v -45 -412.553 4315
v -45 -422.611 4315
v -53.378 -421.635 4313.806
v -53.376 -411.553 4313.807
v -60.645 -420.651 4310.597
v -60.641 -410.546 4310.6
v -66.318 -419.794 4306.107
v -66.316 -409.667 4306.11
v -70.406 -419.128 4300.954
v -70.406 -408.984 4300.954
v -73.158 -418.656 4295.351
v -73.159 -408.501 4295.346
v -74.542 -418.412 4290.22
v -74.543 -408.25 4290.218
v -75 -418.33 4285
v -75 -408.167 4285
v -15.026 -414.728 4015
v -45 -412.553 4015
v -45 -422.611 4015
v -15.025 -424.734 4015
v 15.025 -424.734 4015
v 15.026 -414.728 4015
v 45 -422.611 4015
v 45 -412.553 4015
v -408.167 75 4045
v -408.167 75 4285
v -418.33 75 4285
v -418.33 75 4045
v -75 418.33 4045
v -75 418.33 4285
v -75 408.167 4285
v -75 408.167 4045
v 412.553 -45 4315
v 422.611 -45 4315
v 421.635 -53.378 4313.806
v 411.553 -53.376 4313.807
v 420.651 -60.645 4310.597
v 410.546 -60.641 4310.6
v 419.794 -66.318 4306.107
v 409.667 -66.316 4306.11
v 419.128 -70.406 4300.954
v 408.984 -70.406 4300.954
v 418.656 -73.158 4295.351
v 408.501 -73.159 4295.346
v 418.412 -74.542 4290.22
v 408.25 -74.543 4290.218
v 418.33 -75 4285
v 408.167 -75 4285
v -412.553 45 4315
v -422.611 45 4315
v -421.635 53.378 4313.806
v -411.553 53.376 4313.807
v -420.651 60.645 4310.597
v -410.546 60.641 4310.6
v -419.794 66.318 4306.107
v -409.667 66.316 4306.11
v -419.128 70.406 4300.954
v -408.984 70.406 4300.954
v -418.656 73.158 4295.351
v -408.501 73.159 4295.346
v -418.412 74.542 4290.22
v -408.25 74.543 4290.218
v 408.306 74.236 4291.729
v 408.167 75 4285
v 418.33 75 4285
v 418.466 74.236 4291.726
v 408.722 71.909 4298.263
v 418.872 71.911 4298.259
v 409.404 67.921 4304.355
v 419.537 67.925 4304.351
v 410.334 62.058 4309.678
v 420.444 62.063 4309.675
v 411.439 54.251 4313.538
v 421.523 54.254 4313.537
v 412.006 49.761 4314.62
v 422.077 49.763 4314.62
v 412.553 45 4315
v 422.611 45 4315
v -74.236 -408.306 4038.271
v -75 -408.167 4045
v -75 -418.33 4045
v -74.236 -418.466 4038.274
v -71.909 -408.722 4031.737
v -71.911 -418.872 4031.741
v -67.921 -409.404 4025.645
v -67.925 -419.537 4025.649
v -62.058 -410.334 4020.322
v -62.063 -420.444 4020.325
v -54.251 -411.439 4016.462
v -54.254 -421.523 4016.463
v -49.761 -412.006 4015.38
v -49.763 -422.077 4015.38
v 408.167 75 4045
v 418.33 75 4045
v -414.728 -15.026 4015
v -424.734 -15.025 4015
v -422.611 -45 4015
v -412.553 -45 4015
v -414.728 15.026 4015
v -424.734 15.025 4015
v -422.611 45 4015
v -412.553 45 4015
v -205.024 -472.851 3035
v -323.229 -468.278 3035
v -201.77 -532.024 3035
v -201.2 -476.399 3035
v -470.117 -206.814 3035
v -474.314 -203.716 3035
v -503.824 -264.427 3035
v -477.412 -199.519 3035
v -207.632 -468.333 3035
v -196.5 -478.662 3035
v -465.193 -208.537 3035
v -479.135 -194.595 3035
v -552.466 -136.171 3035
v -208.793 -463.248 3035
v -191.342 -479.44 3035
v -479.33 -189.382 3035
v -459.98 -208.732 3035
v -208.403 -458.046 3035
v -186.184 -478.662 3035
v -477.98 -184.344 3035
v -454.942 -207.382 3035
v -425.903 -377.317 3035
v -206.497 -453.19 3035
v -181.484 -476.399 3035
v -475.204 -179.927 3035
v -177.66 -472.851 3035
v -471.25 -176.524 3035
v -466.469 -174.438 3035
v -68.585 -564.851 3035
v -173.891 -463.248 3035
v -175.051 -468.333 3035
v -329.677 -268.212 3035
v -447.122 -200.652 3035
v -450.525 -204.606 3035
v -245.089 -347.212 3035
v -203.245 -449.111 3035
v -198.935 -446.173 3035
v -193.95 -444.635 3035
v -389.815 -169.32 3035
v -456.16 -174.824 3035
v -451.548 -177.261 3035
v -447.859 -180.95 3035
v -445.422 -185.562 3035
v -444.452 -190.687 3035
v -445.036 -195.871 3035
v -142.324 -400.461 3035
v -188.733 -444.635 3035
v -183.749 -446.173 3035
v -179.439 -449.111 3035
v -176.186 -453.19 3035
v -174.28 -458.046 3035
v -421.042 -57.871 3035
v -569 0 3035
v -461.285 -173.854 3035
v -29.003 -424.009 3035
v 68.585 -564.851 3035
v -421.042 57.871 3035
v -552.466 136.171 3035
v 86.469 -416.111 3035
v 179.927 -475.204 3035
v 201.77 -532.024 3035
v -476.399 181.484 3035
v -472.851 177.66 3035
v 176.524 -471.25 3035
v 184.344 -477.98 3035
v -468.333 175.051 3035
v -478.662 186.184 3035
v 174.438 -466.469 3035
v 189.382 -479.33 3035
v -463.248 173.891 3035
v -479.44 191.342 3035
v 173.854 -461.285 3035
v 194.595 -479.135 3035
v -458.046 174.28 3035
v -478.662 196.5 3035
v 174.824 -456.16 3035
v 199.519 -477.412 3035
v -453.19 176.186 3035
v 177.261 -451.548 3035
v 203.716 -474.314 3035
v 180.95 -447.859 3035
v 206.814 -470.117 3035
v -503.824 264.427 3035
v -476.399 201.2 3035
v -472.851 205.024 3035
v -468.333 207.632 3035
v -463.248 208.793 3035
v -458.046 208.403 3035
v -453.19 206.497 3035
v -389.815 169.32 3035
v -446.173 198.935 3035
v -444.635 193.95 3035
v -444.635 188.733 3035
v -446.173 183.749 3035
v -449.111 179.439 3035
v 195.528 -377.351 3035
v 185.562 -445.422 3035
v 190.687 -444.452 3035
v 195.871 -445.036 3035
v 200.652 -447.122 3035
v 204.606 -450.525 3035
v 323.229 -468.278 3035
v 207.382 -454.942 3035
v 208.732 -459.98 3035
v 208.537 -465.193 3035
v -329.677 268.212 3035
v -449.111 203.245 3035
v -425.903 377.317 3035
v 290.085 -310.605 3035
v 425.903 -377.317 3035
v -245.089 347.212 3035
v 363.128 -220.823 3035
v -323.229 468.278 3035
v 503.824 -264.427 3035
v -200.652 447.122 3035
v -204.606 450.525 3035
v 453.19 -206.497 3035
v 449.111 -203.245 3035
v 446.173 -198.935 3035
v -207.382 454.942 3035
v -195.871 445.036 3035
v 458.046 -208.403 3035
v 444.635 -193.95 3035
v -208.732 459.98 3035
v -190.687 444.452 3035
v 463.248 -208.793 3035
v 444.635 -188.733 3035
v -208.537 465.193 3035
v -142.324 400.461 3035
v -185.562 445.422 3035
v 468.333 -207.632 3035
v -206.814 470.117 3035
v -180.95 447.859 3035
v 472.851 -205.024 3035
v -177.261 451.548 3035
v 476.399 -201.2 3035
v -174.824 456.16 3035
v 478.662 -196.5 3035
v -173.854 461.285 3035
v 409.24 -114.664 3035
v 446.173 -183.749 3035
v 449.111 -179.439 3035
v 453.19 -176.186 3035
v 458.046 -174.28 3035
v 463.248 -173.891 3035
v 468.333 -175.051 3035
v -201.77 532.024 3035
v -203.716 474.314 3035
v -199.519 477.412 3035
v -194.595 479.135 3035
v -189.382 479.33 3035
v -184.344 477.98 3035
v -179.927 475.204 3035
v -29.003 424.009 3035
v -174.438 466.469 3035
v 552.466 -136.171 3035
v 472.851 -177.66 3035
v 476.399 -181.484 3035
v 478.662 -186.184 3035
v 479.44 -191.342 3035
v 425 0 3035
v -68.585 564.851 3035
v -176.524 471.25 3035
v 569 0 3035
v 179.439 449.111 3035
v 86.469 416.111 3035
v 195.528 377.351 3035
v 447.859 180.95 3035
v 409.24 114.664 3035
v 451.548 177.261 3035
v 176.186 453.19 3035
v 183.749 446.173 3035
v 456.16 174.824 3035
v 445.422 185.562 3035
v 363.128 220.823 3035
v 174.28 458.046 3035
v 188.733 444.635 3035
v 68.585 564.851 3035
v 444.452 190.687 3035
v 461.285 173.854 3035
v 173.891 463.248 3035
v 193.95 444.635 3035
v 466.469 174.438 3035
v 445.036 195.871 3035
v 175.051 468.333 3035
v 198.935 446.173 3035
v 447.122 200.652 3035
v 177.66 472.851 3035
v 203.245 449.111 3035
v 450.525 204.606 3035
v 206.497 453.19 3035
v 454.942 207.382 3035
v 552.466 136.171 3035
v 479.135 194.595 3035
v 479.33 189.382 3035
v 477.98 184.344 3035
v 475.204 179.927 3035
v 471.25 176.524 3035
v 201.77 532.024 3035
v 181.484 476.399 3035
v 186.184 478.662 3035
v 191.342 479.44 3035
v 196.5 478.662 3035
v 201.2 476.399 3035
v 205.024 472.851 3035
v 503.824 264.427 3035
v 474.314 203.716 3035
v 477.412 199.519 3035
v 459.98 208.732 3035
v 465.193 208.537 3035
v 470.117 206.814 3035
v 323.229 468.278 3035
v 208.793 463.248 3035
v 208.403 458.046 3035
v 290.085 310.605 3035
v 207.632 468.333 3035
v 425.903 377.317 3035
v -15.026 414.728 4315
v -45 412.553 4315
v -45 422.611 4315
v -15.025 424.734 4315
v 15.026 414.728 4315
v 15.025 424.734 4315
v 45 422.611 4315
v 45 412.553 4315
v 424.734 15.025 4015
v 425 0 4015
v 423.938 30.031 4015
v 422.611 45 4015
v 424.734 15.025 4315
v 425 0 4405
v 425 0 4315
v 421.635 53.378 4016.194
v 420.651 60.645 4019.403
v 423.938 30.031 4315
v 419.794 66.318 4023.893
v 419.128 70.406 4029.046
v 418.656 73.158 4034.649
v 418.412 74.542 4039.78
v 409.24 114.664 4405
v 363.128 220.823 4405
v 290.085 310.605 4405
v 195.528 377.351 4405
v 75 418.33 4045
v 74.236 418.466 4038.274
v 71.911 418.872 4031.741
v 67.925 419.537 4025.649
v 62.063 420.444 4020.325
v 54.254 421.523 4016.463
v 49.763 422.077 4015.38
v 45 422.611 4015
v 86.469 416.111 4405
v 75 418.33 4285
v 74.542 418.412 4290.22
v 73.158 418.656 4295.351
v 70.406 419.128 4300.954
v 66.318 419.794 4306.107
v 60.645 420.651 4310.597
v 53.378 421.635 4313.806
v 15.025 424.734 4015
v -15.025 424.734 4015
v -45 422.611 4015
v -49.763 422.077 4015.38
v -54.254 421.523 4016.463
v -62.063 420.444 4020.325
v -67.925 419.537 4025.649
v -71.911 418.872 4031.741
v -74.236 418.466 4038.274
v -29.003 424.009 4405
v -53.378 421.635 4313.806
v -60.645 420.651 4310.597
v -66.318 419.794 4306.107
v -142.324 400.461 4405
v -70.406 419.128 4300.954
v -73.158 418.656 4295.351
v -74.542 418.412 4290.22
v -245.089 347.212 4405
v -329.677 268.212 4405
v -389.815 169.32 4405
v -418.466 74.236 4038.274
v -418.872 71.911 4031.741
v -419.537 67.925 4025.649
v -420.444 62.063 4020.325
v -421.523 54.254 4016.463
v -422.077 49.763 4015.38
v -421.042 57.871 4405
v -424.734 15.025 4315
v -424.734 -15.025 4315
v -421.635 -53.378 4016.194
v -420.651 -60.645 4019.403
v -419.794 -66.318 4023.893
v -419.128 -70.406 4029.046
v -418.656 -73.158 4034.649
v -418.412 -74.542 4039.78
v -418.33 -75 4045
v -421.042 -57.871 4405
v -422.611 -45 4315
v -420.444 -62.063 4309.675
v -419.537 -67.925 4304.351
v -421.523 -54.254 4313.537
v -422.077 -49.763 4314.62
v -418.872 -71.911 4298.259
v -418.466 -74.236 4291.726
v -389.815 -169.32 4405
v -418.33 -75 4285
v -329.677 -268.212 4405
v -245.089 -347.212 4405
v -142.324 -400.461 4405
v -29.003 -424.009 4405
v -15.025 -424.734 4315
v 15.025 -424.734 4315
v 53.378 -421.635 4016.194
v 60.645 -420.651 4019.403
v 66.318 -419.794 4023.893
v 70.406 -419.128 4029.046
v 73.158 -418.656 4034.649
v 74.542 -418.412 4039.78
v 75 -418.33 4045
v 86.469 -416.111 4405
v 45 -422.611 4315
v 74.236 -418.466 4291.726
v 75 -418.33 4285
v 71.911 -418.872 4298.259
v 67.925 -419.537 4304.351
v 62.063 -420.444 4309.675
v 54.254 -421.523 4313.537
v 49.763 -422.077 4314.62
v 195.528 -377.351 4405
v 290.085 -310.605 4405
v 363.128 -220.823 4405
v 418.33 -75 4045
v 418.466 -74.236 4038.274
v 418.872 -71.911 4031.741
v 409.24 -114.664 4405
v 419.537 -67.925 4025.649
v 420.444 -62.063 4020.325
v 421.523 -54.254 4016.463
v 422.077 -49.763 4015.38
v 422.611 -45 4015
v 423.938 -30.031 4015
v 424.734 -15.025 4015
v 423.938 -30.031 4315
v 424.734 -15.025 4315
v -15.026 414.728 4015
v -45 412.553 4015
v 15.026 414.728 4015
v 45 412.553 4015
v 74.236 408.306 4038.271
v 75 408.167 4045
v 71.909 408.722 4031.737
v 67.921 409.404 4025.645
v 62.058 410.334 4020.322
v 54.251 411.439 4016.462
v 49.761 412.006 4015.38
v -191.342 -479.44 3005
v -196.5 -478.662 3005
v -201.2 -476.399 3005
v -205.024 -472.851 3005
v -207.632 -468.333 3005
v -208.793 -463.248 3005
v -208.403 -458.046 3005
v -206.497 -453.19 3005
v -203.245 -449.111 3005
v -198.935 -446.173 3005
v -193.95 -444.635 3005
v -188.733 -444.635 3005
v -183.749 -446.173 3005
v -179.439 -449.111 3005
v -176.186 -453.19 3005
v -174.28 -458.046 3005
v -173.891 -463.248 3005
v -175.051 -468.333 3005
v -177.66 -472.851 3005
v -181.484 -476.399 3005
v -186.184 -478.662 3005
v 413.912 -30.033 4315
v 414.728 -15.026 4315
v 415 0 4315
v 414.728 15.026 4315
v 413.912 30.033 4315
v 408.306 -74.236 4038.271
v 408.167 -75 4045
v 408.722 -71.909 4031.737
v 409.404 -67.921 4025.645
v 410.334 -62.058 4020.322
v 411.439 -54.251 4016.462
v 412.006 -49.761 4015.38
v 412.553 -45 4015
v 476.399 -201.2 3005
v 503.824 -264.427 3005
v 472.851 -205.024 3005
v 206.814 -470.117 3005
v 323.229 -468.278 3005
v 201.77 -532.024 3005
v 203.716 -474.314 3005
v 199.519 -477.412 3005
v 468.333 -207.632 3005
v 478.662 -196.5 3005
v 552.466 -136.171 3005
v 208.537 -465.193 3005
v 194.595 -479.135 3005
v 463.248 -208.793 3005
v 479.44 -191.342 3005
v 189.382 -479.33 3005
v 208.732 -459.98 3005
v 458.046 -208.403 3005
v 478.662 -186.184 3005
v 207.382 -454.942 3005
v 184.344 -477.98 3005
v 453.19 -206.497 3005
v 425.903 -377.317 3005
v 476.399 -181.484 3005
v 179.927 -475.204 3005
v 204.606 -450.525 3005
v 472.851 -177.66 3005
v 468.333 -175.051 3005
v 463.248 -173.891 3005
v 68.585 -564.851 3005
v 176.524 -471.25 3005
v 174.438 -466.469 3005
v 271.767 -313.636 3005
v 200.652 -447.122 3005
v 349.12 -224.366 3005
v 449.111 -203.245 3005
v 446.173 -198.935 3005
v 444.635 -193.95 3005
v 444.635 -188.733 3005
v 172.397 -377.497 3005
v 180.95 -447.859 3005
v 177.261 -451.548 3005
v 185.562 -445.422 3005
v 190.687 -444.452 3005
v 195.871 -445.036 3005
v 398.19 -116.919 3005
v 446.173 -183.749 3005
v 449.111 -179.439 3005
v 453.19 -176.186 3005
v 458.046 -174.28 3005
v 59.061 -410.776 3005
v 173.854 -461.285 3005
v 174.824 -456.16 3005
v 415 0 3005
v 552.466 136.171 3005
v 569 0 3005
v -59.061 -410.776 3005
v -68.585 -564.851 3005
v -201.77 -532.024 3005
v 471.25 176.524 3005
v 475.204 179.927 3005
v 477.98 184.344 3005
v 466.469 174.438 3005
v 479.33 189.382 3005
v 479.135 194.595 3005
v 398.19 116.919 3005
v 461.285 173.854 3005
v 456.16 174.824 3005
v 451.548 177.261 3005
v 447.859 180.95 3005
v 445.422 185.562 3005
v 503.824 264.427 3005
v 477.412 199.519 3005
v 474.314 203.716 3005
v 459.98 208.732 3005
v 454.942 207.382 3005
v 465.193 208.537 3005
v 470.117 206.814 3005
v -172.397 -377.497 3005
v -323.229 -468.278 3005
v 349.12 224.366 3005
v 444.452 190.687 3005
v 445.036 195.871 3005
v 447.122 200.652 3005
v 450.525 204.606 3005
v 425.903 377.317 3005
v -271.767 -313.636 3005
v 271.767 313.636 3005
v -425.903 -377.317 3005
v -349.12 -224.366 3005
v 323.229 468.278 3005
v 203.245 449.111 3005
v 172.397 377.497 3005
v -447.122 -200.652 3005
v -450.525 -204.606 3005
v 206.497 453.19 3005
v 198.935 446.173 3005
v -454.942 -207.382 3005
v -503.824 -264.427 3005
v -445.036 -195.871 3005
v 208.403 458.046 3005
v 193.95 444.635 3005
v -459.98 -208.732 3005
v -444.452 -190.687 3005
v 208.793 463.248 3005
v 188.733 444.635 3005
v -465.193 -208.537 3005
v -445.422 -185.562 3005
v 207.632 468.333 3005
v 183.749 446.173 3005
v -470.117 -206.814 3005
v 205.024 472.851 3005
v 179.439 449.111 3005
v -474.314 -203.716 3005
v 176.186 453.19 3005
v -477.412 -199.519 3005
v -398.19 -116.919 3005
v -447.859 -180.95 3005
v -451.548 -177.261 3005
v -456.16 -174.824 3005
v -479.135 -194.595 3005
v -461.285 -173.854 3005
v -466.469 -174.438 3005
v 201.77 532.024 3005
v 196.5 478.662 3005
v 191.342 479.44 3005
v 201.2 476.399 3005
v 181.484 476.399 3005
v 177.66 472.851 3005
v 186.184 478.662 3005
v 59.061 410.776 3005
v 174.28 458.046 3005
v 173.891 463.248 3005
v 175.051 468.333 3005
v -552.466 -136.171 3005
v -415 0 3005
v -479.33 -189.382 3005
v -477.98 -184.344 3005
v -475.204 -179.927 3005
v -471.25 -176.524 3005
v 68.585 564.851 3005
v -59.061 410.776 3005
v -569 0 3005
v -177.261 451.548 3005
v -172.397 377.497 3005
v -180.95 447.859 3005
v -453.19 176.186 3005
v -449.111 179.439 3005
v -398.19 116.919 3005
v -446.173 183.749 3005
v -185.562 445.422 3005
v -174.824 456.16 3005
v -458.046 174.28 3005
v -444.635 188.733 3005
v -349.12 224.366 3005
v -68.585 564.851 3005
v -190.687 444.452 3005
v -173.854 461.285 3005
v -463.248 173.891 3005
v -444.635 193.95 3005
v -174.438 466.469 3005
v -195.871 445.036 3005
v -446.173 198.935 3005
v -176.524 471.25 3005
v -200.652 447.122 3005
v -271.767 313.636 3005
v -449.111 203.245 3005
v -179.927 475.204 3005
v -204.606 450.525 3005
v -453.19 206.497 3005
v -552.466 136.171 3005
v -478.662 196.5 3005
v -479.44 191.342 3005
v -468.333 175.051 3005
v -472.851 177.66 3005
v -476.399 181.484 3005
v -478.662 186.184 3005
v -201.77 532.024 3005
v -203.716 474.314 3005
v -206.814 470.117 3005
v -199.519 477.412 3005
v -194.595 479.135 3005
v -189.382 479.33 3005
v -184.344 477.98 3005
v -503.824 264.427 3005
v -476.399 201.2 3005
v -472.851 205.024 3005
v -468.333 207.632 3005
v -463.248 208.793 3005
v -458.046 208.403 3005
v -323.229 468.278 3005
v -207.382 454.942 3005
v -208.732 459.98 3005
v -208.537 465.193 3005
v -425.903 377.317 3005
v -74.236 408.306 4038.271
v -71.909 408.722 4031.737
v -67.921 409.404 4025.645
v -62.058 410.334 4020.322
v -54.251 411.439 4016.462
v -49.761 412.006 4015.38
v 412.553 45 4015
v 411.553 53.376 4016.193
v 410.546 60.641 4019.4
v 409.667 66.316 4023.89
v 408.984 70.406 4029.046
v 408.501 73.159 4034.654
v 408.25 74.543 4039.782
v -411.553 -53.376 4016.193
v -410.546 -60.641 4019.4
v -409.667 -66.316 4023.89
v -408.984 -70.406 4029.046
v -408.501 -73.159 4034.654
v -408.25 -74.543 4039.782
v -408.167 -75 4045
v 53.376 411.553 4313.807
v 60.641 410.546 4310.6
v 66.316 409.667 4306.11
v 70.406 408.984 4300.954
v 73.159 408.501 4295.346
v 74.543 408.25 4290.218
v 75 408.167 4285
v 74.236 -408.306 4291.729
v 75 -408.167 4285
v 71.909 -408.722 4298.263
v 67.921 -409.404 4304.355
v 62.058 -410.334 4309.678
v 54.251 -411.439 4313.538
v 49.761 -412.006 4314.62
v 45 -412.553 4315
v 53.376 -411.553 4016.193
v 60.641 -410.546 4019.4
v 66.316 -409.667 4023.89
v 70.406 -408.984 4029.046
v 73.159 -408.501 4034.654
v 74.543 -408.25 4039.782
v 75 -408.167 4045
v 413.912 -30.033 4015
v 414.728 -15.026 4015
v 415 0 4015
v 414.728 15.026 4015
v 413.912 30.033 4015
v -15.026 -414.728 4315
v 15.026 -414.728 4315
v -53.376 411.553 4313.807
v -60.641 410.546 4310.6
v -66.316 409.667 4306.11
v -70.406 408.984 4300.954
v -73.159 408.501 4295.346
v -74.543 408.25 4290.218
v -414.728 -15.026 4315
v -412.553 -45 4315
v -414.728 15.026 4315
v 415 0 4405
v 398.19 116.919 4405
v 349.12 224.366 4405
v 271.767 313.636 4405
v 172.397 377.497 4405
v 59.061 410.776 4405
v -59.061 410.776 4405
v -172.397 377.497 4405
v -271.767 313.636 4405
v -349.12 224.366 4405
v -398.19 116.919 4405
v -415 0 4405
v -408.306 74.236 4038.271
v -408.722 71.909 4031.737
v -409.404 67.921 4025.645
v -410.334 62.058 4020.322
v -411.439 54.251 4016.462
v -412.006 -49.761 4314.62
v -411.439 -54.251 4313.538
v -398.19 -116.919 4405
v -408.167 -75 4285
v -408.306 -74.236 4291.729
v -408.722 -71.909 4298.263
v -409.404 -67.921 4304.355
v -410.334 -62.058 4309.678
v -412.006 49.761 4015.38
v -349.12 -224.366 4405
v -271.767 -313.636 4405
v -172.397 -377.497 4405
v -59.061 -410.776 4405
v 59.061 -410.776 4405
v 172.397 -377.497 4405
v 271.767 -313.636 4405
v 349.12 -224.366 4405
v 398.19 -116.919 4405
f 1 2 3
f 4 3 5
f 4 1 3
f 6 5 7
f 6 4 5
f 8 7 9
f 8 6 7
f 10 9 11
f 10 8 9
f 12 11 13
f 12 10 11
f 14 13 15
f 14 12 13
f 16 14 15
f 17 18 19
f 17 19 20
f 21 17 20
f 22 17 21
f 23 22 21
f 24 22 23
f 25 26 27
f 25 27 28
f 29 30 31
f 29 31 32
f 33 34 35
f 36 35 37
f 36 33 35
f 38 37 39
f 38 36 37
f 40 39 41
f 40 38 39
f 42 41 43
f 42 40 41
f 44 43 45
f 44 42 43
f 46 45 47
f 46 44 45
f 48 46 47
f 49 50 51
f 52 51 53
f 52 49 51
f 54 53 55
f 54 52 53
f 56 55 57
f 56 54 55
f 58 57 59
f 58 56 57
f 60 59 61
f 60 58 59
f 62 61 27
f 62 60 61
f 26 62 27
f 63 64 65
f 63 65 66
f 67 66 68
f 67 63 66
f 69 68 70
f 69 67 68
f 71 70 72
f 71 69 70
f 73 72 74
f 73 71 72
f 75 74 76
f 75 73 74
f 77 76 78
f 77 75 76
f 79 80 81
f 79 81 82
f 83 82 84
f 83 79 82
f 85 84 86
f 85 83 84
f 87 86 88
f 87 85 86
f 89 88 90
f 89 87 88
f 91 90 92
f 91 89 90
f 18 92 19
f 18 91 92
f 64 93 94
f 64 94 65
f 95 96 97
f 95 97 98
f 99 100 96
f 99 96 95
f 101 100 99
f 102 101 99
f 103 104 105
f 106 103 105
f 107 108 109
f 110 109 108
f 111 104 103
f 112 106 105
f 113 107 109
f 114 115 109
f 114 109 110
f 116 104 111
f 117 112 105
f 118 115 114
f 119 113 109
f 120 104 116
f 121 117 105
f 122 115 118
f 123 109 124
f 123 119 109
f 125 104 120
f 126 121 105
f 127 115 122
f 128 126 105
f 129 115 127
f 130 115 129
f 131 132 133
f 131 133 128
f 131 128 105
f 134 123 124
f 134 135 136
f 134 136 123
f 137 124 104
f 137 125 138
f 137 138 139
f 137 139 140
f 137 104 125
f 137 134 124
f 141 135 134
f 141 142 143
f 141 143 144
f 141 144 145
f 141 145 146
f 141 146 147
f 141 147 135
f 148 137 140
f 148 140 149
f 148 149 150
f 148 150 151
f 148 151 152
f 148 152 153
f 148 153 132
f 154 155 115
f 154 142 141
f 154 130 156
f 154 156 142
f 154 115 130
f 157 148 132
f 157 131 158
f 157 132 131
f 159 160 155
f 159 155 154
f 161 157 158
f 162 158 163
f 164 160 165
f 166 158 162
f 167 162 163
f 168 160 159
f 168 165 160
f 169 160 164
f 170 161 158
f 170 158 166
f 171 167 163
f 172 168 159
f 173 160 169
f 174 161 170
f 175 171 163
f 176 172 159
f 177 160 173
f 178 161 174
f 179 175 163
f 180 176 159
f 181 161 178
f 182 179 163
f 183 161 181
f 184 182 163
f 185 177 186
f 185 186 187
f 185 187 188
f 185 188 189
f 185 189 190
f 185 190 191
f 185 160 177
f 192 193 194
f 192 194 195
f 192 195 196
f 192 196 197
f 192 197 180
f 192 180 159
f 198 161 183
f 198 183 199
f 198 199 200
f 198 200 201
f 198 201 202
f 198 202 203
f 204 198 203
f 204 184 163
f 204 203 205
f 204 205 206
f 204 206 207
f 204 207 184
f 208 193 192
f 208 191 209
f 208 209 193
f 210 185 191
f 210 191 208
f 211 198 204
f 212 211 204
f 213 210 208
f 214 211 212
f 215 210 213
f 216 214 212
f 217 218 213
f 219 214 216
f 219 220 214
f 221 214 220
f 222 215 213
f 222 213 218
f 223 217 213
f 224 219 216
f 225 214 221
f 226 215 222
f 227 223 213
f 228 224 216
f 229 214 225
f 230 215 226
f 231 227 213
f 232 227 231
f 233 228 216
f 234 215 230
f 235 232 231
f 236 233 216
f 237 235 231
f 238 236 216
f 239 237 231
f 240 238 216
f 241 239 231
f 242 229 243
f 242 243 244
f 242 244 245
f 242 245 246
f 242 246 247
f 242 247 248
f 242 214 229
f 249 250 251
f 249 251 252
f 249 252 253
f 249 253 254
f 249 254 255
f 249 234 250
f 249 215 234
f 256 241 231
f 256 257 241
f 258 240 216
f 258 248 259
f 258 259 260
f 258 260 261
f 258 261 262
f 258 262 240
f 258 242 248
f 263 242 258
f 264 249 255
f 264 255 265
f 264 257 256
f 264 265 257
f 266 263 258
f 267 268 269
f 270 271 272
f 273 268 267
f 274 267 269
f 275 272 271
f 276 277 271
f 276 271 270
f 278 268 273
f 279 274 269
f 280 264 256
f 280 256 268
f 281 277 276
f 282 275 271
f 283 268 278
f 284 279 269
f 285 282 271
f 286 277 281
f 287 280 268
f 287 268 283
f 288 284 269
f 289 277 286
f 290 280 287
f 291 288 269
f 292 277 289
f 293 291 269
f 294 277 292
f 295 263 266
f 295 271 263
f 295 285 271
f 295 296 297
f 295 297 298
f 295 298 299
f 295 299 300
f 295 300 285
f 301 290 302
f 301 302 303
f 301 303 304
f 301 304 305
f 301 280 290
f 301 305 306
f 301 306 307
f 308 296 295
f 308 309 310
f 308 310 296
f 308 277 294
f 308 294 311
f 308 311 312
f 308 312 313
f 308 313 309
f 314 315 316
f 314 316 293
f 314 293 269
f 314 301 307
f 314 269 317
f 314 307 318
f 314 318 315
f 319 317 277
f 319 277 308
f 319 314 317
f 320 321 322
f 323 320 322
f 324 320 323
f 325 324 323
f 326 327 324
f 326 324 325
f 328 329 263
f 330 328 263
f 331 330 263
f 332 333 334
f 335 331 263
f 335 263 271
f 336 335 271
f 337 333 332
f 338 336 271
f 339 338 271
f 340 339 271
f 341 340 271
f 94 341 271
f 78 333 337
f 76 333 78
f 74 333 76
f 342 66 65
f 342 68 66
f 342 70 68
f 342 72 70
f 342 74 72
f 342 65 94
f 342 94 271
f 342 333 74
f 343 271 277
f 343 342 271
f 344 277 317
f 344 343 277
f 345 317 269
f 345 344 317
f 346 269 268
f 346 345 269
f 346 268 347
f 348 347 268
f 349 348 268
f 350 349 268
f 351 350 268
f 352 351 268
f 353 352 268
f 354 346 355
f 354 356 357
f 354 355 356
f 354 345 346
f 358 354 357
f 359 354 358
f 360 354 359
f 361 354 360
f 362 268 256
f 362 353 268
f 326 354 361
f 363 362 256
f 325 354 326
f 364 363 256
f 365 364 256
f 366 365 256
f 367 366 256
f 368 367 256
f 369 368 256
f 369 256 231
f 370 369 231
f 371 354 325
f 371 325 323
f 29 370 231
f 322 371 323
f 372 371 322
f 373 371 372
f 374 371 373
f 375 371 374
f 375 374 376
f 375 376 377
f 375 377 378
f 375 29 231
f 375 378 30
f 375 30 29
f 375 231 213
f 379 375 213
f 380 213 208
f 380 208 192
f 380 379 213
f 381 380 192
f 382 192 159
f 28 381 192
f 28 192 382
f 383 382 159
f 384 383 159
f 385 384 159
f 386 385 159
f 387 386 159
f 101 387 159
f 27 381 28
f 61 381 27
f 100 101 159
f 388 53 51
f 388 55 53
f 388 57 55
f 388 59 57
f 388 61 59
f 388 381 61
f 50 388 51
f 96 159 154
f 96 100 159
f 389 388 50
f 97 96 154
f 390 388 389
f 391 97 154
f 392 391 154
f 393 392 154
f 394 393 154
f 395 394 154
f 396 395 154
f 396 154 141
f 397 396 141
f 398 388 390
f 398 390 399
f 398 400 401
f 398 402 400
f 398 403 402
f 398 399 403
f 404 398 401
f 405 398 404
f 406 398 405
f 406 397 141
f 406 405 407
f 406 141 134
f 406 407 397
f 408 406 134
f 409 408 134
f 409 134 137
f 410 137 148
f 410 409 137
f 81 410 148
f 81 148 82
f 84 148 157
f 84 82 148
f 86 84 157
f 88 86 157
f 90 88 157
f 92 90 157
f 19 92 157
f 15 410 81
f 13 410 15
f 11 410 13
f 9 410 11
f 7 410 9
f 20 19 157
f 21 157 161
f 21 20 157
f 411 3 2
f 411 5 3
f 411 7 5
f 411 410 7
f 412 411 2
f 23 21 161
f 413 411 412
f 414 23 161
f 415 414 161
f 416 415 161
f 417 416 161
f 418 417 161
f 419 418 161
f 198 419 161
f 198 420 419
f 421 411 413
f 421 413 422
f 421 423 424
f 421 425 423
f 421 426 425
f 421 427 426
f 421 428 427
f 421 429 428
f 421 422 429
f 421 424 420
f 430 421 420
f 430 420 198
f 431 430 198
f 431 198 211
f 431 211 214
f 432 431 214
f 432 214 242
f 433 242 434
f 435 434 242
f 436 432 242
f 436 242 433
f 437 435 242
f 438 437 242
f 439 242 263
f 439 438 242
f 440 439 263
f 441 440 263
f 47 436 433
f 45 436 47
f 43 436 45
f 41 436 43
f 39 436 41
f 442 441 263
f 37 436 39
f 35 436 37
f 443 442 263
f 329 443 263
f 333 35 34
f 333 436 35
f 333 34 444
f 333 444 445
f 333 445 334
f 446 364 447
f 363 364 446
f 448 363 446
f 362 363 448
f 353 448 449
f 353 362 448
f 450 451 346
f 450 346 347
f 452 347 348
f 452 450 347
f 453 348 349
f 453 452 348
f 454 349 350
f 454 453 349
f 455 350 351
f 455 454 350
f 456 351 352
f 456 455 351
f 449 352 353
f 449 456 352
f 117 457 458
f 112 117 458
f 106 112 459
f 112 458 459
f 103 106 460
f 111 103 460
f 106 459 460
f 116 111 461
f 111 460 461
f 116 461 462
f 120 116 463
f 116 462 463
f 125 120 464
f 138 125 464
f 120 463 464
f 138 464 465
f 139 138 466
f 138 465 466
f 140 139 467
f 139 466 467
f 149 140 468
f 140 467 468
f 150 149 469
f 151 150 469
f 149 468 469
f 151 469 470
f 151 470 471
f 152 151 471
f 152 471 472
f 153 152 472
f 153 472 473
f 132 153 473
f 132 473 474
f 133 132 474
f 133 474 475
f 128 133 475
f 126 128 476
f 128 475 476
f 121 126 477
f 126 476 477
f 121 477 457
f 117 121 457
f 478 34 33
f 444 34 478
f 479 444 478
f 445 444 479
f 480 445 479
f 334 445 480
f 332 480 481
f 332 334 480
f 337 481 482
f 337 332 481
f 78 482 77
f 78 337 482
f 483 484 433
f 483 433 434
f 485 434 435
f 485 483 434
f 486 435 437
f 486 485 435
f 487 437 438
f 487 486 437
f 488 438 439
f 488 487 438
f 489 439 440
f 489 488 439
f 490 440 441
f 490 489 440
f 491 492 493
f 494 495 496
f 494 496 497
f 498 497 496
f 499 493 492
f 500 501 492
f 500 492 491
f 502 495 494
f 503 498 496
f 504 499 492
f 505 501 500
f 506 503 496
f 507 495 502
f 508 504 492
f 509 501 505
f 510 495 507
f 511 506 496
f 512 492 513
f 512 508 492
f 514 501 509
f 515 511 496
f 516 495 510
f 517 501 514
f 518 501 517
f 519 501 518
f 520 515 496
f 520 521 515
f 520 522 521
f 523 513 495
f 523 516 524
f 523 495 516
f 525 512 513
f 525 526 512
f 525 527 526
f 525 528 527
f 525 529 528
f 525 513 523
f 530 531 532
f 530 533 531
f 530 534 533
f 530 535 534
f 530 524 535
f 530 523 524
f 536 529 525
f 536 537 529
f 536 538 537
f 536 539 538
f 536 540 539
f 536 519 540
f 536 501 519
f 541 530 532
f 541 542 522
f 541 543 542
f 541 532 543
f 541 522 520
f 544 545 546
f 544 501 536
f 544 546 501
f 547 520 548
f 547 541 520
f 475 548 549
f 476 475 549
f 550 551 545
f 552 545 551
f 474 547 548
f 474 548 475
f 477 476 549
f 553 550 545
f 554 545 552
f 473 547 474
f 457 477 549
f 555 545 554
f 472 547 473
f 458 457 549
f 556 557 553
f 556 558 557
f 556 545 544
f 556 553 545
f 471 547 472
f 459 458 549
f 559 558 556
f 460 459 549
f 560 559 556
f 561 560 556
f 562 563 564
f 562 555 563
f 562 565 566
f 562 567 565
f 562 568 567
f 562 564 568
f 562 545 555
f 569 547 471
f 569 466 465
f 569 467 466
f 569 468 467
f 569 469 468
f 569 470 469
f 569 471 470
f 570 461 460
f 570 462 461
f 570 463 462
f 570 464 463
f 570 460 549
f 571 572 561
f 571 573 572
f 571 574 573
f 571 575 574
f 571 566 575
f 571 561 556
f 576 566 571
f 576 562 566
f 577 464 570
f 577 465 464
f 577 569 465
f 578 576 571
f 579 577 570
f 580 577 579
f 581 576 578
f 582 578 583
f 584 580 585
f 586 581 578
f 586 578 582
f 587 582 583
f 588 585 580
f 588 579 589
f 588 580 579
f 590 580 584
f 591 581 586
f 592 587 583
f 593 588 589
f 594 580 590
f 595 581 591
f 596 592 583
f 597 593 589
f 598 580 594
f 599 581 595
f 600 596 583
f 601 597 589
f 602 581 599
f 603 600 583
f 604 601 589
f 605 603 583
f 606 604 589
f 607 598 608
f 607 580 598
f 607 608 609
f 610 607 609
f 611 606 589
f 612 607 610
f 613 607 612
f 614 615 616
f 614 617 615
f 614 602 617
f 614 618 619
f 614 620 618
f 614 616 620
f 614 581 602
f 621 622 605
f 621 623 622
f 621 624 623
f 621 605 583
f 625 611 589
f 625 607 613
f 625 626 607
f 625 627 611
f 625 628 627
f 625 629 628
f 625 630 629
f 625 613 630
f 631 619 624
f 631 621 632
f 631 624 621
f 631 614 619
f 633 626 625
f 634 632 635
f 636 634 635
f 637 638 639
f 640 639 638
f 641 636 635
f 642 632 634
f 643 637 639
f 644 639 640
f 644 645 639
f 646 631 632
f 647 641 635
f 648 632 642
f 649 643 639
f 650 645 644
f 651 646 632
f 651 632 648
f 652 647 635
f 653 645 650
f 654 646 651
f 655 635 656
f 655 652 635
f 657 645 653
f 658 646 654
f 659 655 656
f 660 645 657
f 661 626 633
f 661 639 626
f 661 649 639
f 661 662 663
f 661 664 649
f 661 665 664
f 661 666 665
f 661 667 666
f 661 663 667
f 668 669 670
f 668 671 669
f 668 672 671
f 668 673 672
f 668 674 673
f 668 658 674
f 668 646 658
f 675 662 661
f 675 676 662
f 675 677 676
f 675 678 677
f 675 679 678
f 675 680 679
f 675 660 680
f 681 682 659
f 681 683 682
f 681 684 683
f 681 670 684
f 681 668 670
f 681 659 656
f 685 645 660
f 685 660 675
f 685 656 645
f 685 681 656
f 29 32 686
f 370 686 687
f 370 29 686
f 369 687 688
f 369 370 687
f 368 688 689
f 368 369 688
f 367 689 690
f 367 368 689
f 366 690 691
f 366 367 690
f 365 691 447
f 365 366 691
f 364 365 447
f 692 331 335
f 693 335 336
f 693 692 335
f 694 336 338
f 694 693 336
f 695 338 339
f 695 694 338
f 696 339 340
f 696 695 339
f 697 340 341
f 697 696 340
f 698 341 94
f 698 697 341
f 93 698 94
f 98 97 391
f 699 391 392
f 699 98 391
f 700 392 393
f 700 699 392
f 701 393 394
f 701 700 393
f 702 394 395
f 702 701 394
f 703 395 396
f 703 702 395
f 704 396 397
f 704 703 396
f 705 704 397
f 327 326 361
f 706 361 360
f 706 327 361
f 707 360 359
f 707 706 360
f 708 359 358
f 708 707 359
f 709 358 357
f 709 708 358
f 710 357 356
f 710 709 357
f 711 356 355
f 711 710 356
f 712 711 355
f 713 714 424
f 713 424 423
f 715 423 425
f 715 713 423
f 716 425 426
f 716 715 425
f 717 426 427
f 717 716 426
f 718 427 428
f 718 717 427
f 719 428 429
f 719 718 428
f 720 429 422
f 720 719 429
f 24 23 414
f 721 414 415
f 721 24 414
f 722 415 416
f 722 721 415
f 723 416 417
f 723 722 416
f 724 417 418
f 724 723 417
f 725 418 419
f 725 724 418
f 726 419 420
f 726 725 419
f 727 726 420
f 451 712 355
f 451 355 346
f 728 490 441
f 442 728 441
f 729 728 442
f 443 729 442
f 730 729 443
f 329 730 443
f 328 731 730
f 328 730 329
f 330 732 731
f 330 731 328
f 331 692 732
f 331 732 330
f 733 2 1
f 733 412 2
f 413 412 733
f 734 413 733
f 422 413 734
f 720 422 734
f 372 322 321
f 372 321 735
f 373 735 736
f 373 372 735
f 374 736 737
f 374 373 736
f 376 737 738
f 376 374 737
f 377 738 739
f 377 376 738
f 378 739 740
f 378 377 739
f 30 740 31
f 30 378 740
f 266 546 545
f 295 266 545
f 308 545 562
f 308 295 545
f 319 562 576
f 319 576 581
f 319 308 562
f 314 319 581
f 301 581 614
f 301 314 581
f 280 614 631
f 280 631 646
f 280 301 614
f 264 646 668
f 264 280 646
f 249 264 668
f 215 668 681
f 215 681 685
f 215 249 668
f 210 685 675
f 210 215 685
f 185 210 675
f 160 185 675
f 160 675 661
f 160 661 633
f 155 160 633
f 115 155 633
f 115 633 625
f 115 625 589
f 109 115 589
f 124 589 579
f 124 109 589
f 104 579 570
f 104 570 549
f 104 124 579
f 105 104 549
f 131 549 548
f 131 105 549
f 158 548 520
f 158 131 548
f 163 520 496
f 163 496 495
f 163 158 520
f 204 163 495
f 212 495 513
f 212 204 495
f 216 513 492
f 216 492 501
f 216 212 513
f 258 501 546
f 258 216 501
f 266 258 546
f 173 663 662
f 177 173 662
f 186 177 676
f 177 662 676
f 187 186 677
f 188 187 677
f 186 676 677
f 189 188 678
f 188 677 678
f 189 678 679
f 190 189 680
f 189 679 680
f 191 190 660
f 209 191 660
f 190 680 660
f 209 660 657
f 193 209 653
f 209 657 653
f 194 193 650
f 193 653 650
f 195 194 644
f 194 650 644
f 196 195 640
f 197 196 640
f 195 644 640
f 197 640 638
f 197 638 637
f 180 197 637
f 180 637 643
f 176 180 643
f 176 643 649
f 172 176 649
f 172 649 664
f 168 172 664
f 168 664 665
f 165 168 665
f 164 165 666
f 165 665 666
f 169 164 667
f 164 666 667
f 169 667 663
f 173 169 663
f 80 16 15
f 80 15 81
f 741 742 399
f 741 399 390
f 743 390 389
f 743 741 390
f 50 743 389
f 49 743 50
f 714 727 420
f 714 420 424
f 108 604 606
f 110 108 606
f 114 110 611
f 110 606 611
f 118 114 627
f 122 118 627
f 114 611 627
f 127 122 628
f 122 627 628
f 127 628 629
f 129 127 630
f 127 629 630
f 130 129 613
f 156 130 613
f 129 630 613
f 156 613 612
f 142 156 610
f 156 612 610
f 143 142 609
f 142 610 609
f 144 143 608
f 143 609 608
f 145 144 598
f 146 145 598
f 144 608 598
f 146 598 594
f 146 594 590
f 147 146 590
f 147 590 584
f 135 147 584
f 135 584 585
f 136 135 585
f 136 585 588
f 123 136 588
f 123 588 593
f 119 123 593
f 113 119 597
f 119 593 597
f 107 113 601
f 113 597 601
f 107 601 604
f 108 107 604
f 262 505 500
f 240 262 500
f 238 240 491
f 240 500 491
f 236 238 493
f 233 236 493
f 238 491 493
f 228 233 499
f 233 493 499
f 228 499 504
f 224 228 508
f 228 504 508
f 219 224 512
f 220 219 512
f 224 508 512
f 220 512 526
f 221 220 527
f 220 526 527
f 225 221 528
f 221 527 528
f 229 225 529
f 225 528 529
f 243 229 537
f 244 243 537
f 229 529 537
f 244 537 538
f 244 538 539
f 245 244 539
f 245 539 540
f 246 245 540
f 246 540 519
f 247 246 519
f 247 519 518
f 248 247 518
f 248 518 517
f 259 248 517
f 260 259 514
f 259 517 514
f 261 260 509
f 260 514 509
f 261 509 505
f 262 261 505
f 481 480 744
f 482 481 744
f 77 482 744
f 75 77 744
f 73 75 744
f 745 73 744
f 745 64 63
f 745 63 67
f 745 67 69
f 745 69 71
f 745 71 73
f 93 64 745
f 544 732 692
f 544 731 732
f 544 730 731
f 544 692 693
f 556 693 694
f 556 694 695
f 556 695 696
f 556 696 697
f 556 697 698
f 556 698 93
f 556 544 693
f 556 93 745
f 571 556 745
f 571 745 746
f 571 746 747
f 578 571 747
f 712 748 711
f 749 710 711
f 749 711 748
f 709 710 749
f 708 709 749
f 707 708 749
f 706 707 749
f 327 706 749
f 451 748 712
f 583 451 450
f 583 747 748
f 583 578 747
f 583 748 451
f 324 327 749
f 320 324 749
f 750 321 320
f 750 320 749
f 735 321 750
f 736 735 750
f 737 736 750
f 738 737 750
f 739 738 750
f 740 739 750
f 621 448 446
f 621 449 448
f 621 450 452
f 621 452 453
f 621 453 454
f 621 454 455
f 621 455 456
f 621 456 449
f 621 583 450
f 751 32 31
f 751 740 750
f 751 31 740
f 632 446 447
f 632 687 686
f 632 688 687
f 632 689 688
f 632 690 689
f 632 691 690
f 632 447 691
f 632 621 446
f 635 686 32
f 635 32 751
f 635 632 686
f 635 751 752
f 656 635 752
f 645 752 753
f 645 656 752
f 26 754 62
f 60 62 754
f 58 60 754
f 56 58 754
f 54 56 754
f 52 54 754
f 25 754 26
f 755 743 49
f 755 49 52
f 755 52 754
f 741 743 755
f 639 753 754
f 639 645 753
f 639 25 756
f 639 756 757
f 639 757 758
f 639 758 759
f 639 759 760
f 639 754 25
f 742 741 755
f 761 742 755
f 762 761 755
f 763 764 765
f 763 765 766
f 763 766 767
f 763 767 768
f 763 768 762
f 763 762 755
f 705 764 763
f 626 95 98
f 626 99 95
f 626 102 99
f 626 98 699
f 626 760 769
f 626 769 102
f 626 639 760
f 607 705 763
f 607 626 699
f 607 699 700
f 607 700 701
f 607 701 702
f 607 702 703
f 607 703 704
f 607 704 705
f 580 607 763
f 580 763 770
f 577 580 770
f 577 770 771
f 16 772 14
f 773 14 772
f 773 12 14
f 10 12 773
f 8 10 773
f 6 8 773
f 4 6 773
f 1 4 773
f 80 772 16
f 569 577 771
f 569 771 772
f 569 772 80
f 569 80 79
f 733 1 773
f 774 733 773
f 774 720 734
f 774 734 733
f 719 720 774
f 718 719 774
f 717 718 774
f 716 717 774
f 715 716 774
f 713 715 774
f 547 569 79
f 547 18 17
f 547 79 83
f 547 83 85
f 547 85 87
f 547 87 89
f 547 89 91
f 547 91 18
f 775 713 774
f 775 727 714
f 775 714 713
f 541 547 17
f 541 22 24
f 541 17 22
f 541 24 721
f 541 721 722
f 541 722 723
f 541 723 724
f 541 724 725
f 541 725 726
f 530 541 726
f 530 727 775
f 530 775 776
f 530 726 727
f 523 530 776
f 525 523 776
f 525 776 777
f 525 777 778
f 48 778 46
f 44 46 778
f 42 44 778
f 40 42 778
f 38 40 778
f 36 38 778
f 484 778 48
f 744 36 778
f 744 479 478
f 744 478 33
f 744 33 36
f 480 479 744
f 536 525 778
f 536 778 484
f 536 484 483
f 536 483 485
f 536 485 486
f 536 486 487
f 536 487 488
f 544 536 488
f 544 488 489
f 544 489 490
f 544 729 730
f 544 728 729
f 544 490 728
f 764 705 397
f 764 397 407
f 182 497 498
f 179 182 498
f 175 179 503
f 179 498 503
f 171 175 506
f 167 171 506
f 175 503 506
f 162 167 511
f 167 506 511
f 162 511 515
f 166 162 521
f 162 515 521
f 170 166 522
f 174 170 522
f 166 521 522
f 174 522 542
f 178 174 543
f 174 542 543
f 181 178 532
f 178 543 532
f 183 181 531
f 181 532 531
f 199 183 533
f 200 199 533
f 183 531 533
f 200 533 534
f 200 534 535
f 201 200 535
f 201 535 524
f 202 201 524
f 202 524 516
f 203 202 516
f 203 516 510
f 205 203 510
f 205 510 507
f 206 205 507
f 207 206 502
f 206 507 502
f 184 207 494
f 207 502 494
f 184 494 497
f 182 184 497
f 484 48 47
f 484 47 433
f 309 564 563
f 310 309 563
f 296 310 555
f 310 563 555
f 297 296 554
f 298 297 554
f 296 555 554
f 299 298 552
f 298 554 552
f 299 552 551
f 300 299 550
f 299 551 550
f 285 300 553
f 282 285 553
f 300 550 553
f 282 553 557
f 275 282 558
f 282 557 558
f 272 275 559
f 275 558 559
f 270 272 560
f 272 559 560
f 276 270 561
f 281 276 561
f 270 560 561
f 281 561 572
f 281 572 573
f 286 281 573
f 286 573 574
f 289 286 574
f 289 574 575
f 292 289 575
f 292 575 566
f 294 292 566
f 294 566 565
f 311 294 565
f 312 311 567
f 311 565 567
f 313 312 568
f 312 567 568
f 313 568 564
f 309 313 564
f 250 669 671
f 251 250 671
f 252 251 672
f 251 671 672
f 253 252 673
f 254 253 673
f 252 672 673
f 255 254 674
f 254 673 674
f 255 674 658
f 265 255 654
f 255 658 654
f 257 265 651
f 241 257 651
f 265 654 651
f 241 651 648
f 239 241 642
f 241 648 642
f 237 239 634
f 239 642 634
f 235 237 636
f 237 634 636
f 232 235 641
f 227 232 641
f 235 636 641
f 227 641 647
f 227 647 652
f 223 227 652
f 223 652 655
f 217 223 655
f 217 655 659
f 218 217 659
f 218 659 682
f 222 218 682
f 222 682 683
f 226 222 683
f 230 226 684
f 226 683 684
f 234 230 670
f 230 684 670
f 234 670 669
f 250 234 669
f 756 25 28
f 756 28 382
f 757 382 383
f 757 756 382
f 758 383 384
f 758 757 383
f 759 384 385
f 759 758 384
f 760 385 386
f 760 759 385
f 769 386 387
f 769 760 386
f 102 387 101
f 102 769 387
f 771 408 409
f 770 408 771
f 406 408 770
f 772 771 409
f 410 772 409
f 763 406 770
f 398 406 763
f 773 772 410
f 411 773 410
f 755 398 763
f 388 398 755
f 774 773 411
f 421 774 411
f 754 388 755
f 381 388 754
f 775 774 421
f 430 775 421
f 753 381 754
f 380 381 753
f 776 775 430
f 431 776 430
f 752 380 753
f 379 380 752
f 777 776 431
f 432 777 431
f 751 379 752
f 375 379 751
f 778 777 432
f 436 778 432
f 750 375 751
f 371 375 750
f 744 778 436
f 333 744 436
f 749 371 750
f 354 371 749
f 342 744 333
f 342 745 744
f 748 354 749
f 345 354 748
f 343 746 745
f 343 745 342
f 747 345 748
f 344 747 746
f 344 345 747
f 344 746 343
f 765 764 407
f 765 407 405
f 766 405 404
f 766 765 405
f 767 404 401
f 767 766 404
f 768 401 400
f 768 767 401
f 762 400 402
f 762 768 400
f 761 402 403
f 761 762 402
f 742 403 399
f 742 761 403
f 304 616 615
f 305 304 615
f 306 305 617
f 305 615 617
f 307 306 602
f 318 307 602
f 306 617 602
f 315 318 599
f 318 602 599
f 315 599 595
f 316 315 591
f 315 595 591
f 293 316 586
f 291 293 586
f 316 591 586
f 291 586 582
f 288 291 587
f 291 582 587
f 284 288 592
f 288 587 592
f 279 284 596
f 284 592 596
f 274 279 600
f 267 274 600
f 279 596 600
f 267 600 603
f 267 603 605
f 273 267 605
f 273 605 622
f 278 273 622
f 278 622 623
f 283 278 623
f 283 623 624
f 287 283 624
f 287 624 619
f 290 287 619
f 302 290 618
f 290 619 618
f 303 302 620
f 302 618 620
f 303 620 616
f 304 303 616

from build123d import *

# Parameters (mm, degrees)
SKETCH011_R      = 17.5
EXTRUDE005_DEPTH = 30
ARRAY004_COUNT   = 8
EXTRUDE_DEPTH    = 500
ARRAY_COUNT      = 4


with BuildPart() as extrude005:
    # Sketch011 (on Face4 of Cut) → Extrude005 (new body)
    with BuildSketch(Plane(origin=(0, 0, 2955), x_dir=(1, 0, 0), z_dir=(0, 0, -1))):
        with Locations((461.939766, 191.341716)):
            Circle(SKETCH011_R)
    extrude(amount=-EXTRUDE005_DEPTH)


with BuildPart() as array004:
    # Array004 base: copy of Extrude005
    add(extrude005.part)

    # Array004: Array004 ×8 about axis
    array004_axis = Axis((0, 0, 0), (0, 0, 1))


with BuildPart() as array004_1:
    add(array004.part)
    for i in range(1, ARRAY004_COUNT):
        add(array004.part.rotate(array004_axis, i * 360 / ARRAY004_COUNT))


with BuildPart() as array:
    # Sketch010 → Extrude (new body)
    with BuildSketch(Plane.XZ):
        with BuildLine():
            Line((-45, 3965), (45, 3965))
            ThreePointArc((45, 3965), (66.213203, 3973.786797), (75, 3995))
            Line((75, 3995), (75, 4235))
            ThreePointArc((75, 4235), (66.213203, 4256.213203), (45, 4265))
            Line((45, 4265), (-45, 4265))
            ThreePointArc((-45, 4265), (-66.213203, 4256.213203), (-75, 4235))
            Line((-75, 4235), (-75, 3995))
            ThreePointArc((-75, 3995), (-66.213203, 3973.786797), (-45, 3965))
        make_face()
    extrude(amount=EXTRUDE_DEPTH)

    # Array: Array ×4 about axis
    array_axis = Axis((0, 0, 0), (0, 0, 1))


with BuildPart() as array_1:
    add(array.part)
    for i in range(1, ARRAY_COUNT):
        add(array.part.rotate(array_axis, i * 360 / ARRAY_COUNT))


with BuildPart() as top001:
    # Sketch003 → Revolve003 (revolve)
    with BuildSketch(Plane.XZ):
        Polygon((569, 2985), (425, 2985), (425, 4355), (415, 4355), (415, 2955), (569, 2955), align=None)
    revolve(axis=Axis((0, 0, 0), (0, 0, 1)))

    # Cut: cut Array
    add(array_1.part, mode=Mode.SUBTRACT)

    # Cut004: cut Extrude005
    add(extrude005.part, mode=Mode.SUBTRACT)

    # Cut005: cut Array004
    add(array004_1.part, mode=Mode.SUBTRACT)


with BuildPart() as top001_1:
    # Cut005 placement: moved
    add(top001.part.moved(Location((0, 0, 50))))


solid = top001_1.part
